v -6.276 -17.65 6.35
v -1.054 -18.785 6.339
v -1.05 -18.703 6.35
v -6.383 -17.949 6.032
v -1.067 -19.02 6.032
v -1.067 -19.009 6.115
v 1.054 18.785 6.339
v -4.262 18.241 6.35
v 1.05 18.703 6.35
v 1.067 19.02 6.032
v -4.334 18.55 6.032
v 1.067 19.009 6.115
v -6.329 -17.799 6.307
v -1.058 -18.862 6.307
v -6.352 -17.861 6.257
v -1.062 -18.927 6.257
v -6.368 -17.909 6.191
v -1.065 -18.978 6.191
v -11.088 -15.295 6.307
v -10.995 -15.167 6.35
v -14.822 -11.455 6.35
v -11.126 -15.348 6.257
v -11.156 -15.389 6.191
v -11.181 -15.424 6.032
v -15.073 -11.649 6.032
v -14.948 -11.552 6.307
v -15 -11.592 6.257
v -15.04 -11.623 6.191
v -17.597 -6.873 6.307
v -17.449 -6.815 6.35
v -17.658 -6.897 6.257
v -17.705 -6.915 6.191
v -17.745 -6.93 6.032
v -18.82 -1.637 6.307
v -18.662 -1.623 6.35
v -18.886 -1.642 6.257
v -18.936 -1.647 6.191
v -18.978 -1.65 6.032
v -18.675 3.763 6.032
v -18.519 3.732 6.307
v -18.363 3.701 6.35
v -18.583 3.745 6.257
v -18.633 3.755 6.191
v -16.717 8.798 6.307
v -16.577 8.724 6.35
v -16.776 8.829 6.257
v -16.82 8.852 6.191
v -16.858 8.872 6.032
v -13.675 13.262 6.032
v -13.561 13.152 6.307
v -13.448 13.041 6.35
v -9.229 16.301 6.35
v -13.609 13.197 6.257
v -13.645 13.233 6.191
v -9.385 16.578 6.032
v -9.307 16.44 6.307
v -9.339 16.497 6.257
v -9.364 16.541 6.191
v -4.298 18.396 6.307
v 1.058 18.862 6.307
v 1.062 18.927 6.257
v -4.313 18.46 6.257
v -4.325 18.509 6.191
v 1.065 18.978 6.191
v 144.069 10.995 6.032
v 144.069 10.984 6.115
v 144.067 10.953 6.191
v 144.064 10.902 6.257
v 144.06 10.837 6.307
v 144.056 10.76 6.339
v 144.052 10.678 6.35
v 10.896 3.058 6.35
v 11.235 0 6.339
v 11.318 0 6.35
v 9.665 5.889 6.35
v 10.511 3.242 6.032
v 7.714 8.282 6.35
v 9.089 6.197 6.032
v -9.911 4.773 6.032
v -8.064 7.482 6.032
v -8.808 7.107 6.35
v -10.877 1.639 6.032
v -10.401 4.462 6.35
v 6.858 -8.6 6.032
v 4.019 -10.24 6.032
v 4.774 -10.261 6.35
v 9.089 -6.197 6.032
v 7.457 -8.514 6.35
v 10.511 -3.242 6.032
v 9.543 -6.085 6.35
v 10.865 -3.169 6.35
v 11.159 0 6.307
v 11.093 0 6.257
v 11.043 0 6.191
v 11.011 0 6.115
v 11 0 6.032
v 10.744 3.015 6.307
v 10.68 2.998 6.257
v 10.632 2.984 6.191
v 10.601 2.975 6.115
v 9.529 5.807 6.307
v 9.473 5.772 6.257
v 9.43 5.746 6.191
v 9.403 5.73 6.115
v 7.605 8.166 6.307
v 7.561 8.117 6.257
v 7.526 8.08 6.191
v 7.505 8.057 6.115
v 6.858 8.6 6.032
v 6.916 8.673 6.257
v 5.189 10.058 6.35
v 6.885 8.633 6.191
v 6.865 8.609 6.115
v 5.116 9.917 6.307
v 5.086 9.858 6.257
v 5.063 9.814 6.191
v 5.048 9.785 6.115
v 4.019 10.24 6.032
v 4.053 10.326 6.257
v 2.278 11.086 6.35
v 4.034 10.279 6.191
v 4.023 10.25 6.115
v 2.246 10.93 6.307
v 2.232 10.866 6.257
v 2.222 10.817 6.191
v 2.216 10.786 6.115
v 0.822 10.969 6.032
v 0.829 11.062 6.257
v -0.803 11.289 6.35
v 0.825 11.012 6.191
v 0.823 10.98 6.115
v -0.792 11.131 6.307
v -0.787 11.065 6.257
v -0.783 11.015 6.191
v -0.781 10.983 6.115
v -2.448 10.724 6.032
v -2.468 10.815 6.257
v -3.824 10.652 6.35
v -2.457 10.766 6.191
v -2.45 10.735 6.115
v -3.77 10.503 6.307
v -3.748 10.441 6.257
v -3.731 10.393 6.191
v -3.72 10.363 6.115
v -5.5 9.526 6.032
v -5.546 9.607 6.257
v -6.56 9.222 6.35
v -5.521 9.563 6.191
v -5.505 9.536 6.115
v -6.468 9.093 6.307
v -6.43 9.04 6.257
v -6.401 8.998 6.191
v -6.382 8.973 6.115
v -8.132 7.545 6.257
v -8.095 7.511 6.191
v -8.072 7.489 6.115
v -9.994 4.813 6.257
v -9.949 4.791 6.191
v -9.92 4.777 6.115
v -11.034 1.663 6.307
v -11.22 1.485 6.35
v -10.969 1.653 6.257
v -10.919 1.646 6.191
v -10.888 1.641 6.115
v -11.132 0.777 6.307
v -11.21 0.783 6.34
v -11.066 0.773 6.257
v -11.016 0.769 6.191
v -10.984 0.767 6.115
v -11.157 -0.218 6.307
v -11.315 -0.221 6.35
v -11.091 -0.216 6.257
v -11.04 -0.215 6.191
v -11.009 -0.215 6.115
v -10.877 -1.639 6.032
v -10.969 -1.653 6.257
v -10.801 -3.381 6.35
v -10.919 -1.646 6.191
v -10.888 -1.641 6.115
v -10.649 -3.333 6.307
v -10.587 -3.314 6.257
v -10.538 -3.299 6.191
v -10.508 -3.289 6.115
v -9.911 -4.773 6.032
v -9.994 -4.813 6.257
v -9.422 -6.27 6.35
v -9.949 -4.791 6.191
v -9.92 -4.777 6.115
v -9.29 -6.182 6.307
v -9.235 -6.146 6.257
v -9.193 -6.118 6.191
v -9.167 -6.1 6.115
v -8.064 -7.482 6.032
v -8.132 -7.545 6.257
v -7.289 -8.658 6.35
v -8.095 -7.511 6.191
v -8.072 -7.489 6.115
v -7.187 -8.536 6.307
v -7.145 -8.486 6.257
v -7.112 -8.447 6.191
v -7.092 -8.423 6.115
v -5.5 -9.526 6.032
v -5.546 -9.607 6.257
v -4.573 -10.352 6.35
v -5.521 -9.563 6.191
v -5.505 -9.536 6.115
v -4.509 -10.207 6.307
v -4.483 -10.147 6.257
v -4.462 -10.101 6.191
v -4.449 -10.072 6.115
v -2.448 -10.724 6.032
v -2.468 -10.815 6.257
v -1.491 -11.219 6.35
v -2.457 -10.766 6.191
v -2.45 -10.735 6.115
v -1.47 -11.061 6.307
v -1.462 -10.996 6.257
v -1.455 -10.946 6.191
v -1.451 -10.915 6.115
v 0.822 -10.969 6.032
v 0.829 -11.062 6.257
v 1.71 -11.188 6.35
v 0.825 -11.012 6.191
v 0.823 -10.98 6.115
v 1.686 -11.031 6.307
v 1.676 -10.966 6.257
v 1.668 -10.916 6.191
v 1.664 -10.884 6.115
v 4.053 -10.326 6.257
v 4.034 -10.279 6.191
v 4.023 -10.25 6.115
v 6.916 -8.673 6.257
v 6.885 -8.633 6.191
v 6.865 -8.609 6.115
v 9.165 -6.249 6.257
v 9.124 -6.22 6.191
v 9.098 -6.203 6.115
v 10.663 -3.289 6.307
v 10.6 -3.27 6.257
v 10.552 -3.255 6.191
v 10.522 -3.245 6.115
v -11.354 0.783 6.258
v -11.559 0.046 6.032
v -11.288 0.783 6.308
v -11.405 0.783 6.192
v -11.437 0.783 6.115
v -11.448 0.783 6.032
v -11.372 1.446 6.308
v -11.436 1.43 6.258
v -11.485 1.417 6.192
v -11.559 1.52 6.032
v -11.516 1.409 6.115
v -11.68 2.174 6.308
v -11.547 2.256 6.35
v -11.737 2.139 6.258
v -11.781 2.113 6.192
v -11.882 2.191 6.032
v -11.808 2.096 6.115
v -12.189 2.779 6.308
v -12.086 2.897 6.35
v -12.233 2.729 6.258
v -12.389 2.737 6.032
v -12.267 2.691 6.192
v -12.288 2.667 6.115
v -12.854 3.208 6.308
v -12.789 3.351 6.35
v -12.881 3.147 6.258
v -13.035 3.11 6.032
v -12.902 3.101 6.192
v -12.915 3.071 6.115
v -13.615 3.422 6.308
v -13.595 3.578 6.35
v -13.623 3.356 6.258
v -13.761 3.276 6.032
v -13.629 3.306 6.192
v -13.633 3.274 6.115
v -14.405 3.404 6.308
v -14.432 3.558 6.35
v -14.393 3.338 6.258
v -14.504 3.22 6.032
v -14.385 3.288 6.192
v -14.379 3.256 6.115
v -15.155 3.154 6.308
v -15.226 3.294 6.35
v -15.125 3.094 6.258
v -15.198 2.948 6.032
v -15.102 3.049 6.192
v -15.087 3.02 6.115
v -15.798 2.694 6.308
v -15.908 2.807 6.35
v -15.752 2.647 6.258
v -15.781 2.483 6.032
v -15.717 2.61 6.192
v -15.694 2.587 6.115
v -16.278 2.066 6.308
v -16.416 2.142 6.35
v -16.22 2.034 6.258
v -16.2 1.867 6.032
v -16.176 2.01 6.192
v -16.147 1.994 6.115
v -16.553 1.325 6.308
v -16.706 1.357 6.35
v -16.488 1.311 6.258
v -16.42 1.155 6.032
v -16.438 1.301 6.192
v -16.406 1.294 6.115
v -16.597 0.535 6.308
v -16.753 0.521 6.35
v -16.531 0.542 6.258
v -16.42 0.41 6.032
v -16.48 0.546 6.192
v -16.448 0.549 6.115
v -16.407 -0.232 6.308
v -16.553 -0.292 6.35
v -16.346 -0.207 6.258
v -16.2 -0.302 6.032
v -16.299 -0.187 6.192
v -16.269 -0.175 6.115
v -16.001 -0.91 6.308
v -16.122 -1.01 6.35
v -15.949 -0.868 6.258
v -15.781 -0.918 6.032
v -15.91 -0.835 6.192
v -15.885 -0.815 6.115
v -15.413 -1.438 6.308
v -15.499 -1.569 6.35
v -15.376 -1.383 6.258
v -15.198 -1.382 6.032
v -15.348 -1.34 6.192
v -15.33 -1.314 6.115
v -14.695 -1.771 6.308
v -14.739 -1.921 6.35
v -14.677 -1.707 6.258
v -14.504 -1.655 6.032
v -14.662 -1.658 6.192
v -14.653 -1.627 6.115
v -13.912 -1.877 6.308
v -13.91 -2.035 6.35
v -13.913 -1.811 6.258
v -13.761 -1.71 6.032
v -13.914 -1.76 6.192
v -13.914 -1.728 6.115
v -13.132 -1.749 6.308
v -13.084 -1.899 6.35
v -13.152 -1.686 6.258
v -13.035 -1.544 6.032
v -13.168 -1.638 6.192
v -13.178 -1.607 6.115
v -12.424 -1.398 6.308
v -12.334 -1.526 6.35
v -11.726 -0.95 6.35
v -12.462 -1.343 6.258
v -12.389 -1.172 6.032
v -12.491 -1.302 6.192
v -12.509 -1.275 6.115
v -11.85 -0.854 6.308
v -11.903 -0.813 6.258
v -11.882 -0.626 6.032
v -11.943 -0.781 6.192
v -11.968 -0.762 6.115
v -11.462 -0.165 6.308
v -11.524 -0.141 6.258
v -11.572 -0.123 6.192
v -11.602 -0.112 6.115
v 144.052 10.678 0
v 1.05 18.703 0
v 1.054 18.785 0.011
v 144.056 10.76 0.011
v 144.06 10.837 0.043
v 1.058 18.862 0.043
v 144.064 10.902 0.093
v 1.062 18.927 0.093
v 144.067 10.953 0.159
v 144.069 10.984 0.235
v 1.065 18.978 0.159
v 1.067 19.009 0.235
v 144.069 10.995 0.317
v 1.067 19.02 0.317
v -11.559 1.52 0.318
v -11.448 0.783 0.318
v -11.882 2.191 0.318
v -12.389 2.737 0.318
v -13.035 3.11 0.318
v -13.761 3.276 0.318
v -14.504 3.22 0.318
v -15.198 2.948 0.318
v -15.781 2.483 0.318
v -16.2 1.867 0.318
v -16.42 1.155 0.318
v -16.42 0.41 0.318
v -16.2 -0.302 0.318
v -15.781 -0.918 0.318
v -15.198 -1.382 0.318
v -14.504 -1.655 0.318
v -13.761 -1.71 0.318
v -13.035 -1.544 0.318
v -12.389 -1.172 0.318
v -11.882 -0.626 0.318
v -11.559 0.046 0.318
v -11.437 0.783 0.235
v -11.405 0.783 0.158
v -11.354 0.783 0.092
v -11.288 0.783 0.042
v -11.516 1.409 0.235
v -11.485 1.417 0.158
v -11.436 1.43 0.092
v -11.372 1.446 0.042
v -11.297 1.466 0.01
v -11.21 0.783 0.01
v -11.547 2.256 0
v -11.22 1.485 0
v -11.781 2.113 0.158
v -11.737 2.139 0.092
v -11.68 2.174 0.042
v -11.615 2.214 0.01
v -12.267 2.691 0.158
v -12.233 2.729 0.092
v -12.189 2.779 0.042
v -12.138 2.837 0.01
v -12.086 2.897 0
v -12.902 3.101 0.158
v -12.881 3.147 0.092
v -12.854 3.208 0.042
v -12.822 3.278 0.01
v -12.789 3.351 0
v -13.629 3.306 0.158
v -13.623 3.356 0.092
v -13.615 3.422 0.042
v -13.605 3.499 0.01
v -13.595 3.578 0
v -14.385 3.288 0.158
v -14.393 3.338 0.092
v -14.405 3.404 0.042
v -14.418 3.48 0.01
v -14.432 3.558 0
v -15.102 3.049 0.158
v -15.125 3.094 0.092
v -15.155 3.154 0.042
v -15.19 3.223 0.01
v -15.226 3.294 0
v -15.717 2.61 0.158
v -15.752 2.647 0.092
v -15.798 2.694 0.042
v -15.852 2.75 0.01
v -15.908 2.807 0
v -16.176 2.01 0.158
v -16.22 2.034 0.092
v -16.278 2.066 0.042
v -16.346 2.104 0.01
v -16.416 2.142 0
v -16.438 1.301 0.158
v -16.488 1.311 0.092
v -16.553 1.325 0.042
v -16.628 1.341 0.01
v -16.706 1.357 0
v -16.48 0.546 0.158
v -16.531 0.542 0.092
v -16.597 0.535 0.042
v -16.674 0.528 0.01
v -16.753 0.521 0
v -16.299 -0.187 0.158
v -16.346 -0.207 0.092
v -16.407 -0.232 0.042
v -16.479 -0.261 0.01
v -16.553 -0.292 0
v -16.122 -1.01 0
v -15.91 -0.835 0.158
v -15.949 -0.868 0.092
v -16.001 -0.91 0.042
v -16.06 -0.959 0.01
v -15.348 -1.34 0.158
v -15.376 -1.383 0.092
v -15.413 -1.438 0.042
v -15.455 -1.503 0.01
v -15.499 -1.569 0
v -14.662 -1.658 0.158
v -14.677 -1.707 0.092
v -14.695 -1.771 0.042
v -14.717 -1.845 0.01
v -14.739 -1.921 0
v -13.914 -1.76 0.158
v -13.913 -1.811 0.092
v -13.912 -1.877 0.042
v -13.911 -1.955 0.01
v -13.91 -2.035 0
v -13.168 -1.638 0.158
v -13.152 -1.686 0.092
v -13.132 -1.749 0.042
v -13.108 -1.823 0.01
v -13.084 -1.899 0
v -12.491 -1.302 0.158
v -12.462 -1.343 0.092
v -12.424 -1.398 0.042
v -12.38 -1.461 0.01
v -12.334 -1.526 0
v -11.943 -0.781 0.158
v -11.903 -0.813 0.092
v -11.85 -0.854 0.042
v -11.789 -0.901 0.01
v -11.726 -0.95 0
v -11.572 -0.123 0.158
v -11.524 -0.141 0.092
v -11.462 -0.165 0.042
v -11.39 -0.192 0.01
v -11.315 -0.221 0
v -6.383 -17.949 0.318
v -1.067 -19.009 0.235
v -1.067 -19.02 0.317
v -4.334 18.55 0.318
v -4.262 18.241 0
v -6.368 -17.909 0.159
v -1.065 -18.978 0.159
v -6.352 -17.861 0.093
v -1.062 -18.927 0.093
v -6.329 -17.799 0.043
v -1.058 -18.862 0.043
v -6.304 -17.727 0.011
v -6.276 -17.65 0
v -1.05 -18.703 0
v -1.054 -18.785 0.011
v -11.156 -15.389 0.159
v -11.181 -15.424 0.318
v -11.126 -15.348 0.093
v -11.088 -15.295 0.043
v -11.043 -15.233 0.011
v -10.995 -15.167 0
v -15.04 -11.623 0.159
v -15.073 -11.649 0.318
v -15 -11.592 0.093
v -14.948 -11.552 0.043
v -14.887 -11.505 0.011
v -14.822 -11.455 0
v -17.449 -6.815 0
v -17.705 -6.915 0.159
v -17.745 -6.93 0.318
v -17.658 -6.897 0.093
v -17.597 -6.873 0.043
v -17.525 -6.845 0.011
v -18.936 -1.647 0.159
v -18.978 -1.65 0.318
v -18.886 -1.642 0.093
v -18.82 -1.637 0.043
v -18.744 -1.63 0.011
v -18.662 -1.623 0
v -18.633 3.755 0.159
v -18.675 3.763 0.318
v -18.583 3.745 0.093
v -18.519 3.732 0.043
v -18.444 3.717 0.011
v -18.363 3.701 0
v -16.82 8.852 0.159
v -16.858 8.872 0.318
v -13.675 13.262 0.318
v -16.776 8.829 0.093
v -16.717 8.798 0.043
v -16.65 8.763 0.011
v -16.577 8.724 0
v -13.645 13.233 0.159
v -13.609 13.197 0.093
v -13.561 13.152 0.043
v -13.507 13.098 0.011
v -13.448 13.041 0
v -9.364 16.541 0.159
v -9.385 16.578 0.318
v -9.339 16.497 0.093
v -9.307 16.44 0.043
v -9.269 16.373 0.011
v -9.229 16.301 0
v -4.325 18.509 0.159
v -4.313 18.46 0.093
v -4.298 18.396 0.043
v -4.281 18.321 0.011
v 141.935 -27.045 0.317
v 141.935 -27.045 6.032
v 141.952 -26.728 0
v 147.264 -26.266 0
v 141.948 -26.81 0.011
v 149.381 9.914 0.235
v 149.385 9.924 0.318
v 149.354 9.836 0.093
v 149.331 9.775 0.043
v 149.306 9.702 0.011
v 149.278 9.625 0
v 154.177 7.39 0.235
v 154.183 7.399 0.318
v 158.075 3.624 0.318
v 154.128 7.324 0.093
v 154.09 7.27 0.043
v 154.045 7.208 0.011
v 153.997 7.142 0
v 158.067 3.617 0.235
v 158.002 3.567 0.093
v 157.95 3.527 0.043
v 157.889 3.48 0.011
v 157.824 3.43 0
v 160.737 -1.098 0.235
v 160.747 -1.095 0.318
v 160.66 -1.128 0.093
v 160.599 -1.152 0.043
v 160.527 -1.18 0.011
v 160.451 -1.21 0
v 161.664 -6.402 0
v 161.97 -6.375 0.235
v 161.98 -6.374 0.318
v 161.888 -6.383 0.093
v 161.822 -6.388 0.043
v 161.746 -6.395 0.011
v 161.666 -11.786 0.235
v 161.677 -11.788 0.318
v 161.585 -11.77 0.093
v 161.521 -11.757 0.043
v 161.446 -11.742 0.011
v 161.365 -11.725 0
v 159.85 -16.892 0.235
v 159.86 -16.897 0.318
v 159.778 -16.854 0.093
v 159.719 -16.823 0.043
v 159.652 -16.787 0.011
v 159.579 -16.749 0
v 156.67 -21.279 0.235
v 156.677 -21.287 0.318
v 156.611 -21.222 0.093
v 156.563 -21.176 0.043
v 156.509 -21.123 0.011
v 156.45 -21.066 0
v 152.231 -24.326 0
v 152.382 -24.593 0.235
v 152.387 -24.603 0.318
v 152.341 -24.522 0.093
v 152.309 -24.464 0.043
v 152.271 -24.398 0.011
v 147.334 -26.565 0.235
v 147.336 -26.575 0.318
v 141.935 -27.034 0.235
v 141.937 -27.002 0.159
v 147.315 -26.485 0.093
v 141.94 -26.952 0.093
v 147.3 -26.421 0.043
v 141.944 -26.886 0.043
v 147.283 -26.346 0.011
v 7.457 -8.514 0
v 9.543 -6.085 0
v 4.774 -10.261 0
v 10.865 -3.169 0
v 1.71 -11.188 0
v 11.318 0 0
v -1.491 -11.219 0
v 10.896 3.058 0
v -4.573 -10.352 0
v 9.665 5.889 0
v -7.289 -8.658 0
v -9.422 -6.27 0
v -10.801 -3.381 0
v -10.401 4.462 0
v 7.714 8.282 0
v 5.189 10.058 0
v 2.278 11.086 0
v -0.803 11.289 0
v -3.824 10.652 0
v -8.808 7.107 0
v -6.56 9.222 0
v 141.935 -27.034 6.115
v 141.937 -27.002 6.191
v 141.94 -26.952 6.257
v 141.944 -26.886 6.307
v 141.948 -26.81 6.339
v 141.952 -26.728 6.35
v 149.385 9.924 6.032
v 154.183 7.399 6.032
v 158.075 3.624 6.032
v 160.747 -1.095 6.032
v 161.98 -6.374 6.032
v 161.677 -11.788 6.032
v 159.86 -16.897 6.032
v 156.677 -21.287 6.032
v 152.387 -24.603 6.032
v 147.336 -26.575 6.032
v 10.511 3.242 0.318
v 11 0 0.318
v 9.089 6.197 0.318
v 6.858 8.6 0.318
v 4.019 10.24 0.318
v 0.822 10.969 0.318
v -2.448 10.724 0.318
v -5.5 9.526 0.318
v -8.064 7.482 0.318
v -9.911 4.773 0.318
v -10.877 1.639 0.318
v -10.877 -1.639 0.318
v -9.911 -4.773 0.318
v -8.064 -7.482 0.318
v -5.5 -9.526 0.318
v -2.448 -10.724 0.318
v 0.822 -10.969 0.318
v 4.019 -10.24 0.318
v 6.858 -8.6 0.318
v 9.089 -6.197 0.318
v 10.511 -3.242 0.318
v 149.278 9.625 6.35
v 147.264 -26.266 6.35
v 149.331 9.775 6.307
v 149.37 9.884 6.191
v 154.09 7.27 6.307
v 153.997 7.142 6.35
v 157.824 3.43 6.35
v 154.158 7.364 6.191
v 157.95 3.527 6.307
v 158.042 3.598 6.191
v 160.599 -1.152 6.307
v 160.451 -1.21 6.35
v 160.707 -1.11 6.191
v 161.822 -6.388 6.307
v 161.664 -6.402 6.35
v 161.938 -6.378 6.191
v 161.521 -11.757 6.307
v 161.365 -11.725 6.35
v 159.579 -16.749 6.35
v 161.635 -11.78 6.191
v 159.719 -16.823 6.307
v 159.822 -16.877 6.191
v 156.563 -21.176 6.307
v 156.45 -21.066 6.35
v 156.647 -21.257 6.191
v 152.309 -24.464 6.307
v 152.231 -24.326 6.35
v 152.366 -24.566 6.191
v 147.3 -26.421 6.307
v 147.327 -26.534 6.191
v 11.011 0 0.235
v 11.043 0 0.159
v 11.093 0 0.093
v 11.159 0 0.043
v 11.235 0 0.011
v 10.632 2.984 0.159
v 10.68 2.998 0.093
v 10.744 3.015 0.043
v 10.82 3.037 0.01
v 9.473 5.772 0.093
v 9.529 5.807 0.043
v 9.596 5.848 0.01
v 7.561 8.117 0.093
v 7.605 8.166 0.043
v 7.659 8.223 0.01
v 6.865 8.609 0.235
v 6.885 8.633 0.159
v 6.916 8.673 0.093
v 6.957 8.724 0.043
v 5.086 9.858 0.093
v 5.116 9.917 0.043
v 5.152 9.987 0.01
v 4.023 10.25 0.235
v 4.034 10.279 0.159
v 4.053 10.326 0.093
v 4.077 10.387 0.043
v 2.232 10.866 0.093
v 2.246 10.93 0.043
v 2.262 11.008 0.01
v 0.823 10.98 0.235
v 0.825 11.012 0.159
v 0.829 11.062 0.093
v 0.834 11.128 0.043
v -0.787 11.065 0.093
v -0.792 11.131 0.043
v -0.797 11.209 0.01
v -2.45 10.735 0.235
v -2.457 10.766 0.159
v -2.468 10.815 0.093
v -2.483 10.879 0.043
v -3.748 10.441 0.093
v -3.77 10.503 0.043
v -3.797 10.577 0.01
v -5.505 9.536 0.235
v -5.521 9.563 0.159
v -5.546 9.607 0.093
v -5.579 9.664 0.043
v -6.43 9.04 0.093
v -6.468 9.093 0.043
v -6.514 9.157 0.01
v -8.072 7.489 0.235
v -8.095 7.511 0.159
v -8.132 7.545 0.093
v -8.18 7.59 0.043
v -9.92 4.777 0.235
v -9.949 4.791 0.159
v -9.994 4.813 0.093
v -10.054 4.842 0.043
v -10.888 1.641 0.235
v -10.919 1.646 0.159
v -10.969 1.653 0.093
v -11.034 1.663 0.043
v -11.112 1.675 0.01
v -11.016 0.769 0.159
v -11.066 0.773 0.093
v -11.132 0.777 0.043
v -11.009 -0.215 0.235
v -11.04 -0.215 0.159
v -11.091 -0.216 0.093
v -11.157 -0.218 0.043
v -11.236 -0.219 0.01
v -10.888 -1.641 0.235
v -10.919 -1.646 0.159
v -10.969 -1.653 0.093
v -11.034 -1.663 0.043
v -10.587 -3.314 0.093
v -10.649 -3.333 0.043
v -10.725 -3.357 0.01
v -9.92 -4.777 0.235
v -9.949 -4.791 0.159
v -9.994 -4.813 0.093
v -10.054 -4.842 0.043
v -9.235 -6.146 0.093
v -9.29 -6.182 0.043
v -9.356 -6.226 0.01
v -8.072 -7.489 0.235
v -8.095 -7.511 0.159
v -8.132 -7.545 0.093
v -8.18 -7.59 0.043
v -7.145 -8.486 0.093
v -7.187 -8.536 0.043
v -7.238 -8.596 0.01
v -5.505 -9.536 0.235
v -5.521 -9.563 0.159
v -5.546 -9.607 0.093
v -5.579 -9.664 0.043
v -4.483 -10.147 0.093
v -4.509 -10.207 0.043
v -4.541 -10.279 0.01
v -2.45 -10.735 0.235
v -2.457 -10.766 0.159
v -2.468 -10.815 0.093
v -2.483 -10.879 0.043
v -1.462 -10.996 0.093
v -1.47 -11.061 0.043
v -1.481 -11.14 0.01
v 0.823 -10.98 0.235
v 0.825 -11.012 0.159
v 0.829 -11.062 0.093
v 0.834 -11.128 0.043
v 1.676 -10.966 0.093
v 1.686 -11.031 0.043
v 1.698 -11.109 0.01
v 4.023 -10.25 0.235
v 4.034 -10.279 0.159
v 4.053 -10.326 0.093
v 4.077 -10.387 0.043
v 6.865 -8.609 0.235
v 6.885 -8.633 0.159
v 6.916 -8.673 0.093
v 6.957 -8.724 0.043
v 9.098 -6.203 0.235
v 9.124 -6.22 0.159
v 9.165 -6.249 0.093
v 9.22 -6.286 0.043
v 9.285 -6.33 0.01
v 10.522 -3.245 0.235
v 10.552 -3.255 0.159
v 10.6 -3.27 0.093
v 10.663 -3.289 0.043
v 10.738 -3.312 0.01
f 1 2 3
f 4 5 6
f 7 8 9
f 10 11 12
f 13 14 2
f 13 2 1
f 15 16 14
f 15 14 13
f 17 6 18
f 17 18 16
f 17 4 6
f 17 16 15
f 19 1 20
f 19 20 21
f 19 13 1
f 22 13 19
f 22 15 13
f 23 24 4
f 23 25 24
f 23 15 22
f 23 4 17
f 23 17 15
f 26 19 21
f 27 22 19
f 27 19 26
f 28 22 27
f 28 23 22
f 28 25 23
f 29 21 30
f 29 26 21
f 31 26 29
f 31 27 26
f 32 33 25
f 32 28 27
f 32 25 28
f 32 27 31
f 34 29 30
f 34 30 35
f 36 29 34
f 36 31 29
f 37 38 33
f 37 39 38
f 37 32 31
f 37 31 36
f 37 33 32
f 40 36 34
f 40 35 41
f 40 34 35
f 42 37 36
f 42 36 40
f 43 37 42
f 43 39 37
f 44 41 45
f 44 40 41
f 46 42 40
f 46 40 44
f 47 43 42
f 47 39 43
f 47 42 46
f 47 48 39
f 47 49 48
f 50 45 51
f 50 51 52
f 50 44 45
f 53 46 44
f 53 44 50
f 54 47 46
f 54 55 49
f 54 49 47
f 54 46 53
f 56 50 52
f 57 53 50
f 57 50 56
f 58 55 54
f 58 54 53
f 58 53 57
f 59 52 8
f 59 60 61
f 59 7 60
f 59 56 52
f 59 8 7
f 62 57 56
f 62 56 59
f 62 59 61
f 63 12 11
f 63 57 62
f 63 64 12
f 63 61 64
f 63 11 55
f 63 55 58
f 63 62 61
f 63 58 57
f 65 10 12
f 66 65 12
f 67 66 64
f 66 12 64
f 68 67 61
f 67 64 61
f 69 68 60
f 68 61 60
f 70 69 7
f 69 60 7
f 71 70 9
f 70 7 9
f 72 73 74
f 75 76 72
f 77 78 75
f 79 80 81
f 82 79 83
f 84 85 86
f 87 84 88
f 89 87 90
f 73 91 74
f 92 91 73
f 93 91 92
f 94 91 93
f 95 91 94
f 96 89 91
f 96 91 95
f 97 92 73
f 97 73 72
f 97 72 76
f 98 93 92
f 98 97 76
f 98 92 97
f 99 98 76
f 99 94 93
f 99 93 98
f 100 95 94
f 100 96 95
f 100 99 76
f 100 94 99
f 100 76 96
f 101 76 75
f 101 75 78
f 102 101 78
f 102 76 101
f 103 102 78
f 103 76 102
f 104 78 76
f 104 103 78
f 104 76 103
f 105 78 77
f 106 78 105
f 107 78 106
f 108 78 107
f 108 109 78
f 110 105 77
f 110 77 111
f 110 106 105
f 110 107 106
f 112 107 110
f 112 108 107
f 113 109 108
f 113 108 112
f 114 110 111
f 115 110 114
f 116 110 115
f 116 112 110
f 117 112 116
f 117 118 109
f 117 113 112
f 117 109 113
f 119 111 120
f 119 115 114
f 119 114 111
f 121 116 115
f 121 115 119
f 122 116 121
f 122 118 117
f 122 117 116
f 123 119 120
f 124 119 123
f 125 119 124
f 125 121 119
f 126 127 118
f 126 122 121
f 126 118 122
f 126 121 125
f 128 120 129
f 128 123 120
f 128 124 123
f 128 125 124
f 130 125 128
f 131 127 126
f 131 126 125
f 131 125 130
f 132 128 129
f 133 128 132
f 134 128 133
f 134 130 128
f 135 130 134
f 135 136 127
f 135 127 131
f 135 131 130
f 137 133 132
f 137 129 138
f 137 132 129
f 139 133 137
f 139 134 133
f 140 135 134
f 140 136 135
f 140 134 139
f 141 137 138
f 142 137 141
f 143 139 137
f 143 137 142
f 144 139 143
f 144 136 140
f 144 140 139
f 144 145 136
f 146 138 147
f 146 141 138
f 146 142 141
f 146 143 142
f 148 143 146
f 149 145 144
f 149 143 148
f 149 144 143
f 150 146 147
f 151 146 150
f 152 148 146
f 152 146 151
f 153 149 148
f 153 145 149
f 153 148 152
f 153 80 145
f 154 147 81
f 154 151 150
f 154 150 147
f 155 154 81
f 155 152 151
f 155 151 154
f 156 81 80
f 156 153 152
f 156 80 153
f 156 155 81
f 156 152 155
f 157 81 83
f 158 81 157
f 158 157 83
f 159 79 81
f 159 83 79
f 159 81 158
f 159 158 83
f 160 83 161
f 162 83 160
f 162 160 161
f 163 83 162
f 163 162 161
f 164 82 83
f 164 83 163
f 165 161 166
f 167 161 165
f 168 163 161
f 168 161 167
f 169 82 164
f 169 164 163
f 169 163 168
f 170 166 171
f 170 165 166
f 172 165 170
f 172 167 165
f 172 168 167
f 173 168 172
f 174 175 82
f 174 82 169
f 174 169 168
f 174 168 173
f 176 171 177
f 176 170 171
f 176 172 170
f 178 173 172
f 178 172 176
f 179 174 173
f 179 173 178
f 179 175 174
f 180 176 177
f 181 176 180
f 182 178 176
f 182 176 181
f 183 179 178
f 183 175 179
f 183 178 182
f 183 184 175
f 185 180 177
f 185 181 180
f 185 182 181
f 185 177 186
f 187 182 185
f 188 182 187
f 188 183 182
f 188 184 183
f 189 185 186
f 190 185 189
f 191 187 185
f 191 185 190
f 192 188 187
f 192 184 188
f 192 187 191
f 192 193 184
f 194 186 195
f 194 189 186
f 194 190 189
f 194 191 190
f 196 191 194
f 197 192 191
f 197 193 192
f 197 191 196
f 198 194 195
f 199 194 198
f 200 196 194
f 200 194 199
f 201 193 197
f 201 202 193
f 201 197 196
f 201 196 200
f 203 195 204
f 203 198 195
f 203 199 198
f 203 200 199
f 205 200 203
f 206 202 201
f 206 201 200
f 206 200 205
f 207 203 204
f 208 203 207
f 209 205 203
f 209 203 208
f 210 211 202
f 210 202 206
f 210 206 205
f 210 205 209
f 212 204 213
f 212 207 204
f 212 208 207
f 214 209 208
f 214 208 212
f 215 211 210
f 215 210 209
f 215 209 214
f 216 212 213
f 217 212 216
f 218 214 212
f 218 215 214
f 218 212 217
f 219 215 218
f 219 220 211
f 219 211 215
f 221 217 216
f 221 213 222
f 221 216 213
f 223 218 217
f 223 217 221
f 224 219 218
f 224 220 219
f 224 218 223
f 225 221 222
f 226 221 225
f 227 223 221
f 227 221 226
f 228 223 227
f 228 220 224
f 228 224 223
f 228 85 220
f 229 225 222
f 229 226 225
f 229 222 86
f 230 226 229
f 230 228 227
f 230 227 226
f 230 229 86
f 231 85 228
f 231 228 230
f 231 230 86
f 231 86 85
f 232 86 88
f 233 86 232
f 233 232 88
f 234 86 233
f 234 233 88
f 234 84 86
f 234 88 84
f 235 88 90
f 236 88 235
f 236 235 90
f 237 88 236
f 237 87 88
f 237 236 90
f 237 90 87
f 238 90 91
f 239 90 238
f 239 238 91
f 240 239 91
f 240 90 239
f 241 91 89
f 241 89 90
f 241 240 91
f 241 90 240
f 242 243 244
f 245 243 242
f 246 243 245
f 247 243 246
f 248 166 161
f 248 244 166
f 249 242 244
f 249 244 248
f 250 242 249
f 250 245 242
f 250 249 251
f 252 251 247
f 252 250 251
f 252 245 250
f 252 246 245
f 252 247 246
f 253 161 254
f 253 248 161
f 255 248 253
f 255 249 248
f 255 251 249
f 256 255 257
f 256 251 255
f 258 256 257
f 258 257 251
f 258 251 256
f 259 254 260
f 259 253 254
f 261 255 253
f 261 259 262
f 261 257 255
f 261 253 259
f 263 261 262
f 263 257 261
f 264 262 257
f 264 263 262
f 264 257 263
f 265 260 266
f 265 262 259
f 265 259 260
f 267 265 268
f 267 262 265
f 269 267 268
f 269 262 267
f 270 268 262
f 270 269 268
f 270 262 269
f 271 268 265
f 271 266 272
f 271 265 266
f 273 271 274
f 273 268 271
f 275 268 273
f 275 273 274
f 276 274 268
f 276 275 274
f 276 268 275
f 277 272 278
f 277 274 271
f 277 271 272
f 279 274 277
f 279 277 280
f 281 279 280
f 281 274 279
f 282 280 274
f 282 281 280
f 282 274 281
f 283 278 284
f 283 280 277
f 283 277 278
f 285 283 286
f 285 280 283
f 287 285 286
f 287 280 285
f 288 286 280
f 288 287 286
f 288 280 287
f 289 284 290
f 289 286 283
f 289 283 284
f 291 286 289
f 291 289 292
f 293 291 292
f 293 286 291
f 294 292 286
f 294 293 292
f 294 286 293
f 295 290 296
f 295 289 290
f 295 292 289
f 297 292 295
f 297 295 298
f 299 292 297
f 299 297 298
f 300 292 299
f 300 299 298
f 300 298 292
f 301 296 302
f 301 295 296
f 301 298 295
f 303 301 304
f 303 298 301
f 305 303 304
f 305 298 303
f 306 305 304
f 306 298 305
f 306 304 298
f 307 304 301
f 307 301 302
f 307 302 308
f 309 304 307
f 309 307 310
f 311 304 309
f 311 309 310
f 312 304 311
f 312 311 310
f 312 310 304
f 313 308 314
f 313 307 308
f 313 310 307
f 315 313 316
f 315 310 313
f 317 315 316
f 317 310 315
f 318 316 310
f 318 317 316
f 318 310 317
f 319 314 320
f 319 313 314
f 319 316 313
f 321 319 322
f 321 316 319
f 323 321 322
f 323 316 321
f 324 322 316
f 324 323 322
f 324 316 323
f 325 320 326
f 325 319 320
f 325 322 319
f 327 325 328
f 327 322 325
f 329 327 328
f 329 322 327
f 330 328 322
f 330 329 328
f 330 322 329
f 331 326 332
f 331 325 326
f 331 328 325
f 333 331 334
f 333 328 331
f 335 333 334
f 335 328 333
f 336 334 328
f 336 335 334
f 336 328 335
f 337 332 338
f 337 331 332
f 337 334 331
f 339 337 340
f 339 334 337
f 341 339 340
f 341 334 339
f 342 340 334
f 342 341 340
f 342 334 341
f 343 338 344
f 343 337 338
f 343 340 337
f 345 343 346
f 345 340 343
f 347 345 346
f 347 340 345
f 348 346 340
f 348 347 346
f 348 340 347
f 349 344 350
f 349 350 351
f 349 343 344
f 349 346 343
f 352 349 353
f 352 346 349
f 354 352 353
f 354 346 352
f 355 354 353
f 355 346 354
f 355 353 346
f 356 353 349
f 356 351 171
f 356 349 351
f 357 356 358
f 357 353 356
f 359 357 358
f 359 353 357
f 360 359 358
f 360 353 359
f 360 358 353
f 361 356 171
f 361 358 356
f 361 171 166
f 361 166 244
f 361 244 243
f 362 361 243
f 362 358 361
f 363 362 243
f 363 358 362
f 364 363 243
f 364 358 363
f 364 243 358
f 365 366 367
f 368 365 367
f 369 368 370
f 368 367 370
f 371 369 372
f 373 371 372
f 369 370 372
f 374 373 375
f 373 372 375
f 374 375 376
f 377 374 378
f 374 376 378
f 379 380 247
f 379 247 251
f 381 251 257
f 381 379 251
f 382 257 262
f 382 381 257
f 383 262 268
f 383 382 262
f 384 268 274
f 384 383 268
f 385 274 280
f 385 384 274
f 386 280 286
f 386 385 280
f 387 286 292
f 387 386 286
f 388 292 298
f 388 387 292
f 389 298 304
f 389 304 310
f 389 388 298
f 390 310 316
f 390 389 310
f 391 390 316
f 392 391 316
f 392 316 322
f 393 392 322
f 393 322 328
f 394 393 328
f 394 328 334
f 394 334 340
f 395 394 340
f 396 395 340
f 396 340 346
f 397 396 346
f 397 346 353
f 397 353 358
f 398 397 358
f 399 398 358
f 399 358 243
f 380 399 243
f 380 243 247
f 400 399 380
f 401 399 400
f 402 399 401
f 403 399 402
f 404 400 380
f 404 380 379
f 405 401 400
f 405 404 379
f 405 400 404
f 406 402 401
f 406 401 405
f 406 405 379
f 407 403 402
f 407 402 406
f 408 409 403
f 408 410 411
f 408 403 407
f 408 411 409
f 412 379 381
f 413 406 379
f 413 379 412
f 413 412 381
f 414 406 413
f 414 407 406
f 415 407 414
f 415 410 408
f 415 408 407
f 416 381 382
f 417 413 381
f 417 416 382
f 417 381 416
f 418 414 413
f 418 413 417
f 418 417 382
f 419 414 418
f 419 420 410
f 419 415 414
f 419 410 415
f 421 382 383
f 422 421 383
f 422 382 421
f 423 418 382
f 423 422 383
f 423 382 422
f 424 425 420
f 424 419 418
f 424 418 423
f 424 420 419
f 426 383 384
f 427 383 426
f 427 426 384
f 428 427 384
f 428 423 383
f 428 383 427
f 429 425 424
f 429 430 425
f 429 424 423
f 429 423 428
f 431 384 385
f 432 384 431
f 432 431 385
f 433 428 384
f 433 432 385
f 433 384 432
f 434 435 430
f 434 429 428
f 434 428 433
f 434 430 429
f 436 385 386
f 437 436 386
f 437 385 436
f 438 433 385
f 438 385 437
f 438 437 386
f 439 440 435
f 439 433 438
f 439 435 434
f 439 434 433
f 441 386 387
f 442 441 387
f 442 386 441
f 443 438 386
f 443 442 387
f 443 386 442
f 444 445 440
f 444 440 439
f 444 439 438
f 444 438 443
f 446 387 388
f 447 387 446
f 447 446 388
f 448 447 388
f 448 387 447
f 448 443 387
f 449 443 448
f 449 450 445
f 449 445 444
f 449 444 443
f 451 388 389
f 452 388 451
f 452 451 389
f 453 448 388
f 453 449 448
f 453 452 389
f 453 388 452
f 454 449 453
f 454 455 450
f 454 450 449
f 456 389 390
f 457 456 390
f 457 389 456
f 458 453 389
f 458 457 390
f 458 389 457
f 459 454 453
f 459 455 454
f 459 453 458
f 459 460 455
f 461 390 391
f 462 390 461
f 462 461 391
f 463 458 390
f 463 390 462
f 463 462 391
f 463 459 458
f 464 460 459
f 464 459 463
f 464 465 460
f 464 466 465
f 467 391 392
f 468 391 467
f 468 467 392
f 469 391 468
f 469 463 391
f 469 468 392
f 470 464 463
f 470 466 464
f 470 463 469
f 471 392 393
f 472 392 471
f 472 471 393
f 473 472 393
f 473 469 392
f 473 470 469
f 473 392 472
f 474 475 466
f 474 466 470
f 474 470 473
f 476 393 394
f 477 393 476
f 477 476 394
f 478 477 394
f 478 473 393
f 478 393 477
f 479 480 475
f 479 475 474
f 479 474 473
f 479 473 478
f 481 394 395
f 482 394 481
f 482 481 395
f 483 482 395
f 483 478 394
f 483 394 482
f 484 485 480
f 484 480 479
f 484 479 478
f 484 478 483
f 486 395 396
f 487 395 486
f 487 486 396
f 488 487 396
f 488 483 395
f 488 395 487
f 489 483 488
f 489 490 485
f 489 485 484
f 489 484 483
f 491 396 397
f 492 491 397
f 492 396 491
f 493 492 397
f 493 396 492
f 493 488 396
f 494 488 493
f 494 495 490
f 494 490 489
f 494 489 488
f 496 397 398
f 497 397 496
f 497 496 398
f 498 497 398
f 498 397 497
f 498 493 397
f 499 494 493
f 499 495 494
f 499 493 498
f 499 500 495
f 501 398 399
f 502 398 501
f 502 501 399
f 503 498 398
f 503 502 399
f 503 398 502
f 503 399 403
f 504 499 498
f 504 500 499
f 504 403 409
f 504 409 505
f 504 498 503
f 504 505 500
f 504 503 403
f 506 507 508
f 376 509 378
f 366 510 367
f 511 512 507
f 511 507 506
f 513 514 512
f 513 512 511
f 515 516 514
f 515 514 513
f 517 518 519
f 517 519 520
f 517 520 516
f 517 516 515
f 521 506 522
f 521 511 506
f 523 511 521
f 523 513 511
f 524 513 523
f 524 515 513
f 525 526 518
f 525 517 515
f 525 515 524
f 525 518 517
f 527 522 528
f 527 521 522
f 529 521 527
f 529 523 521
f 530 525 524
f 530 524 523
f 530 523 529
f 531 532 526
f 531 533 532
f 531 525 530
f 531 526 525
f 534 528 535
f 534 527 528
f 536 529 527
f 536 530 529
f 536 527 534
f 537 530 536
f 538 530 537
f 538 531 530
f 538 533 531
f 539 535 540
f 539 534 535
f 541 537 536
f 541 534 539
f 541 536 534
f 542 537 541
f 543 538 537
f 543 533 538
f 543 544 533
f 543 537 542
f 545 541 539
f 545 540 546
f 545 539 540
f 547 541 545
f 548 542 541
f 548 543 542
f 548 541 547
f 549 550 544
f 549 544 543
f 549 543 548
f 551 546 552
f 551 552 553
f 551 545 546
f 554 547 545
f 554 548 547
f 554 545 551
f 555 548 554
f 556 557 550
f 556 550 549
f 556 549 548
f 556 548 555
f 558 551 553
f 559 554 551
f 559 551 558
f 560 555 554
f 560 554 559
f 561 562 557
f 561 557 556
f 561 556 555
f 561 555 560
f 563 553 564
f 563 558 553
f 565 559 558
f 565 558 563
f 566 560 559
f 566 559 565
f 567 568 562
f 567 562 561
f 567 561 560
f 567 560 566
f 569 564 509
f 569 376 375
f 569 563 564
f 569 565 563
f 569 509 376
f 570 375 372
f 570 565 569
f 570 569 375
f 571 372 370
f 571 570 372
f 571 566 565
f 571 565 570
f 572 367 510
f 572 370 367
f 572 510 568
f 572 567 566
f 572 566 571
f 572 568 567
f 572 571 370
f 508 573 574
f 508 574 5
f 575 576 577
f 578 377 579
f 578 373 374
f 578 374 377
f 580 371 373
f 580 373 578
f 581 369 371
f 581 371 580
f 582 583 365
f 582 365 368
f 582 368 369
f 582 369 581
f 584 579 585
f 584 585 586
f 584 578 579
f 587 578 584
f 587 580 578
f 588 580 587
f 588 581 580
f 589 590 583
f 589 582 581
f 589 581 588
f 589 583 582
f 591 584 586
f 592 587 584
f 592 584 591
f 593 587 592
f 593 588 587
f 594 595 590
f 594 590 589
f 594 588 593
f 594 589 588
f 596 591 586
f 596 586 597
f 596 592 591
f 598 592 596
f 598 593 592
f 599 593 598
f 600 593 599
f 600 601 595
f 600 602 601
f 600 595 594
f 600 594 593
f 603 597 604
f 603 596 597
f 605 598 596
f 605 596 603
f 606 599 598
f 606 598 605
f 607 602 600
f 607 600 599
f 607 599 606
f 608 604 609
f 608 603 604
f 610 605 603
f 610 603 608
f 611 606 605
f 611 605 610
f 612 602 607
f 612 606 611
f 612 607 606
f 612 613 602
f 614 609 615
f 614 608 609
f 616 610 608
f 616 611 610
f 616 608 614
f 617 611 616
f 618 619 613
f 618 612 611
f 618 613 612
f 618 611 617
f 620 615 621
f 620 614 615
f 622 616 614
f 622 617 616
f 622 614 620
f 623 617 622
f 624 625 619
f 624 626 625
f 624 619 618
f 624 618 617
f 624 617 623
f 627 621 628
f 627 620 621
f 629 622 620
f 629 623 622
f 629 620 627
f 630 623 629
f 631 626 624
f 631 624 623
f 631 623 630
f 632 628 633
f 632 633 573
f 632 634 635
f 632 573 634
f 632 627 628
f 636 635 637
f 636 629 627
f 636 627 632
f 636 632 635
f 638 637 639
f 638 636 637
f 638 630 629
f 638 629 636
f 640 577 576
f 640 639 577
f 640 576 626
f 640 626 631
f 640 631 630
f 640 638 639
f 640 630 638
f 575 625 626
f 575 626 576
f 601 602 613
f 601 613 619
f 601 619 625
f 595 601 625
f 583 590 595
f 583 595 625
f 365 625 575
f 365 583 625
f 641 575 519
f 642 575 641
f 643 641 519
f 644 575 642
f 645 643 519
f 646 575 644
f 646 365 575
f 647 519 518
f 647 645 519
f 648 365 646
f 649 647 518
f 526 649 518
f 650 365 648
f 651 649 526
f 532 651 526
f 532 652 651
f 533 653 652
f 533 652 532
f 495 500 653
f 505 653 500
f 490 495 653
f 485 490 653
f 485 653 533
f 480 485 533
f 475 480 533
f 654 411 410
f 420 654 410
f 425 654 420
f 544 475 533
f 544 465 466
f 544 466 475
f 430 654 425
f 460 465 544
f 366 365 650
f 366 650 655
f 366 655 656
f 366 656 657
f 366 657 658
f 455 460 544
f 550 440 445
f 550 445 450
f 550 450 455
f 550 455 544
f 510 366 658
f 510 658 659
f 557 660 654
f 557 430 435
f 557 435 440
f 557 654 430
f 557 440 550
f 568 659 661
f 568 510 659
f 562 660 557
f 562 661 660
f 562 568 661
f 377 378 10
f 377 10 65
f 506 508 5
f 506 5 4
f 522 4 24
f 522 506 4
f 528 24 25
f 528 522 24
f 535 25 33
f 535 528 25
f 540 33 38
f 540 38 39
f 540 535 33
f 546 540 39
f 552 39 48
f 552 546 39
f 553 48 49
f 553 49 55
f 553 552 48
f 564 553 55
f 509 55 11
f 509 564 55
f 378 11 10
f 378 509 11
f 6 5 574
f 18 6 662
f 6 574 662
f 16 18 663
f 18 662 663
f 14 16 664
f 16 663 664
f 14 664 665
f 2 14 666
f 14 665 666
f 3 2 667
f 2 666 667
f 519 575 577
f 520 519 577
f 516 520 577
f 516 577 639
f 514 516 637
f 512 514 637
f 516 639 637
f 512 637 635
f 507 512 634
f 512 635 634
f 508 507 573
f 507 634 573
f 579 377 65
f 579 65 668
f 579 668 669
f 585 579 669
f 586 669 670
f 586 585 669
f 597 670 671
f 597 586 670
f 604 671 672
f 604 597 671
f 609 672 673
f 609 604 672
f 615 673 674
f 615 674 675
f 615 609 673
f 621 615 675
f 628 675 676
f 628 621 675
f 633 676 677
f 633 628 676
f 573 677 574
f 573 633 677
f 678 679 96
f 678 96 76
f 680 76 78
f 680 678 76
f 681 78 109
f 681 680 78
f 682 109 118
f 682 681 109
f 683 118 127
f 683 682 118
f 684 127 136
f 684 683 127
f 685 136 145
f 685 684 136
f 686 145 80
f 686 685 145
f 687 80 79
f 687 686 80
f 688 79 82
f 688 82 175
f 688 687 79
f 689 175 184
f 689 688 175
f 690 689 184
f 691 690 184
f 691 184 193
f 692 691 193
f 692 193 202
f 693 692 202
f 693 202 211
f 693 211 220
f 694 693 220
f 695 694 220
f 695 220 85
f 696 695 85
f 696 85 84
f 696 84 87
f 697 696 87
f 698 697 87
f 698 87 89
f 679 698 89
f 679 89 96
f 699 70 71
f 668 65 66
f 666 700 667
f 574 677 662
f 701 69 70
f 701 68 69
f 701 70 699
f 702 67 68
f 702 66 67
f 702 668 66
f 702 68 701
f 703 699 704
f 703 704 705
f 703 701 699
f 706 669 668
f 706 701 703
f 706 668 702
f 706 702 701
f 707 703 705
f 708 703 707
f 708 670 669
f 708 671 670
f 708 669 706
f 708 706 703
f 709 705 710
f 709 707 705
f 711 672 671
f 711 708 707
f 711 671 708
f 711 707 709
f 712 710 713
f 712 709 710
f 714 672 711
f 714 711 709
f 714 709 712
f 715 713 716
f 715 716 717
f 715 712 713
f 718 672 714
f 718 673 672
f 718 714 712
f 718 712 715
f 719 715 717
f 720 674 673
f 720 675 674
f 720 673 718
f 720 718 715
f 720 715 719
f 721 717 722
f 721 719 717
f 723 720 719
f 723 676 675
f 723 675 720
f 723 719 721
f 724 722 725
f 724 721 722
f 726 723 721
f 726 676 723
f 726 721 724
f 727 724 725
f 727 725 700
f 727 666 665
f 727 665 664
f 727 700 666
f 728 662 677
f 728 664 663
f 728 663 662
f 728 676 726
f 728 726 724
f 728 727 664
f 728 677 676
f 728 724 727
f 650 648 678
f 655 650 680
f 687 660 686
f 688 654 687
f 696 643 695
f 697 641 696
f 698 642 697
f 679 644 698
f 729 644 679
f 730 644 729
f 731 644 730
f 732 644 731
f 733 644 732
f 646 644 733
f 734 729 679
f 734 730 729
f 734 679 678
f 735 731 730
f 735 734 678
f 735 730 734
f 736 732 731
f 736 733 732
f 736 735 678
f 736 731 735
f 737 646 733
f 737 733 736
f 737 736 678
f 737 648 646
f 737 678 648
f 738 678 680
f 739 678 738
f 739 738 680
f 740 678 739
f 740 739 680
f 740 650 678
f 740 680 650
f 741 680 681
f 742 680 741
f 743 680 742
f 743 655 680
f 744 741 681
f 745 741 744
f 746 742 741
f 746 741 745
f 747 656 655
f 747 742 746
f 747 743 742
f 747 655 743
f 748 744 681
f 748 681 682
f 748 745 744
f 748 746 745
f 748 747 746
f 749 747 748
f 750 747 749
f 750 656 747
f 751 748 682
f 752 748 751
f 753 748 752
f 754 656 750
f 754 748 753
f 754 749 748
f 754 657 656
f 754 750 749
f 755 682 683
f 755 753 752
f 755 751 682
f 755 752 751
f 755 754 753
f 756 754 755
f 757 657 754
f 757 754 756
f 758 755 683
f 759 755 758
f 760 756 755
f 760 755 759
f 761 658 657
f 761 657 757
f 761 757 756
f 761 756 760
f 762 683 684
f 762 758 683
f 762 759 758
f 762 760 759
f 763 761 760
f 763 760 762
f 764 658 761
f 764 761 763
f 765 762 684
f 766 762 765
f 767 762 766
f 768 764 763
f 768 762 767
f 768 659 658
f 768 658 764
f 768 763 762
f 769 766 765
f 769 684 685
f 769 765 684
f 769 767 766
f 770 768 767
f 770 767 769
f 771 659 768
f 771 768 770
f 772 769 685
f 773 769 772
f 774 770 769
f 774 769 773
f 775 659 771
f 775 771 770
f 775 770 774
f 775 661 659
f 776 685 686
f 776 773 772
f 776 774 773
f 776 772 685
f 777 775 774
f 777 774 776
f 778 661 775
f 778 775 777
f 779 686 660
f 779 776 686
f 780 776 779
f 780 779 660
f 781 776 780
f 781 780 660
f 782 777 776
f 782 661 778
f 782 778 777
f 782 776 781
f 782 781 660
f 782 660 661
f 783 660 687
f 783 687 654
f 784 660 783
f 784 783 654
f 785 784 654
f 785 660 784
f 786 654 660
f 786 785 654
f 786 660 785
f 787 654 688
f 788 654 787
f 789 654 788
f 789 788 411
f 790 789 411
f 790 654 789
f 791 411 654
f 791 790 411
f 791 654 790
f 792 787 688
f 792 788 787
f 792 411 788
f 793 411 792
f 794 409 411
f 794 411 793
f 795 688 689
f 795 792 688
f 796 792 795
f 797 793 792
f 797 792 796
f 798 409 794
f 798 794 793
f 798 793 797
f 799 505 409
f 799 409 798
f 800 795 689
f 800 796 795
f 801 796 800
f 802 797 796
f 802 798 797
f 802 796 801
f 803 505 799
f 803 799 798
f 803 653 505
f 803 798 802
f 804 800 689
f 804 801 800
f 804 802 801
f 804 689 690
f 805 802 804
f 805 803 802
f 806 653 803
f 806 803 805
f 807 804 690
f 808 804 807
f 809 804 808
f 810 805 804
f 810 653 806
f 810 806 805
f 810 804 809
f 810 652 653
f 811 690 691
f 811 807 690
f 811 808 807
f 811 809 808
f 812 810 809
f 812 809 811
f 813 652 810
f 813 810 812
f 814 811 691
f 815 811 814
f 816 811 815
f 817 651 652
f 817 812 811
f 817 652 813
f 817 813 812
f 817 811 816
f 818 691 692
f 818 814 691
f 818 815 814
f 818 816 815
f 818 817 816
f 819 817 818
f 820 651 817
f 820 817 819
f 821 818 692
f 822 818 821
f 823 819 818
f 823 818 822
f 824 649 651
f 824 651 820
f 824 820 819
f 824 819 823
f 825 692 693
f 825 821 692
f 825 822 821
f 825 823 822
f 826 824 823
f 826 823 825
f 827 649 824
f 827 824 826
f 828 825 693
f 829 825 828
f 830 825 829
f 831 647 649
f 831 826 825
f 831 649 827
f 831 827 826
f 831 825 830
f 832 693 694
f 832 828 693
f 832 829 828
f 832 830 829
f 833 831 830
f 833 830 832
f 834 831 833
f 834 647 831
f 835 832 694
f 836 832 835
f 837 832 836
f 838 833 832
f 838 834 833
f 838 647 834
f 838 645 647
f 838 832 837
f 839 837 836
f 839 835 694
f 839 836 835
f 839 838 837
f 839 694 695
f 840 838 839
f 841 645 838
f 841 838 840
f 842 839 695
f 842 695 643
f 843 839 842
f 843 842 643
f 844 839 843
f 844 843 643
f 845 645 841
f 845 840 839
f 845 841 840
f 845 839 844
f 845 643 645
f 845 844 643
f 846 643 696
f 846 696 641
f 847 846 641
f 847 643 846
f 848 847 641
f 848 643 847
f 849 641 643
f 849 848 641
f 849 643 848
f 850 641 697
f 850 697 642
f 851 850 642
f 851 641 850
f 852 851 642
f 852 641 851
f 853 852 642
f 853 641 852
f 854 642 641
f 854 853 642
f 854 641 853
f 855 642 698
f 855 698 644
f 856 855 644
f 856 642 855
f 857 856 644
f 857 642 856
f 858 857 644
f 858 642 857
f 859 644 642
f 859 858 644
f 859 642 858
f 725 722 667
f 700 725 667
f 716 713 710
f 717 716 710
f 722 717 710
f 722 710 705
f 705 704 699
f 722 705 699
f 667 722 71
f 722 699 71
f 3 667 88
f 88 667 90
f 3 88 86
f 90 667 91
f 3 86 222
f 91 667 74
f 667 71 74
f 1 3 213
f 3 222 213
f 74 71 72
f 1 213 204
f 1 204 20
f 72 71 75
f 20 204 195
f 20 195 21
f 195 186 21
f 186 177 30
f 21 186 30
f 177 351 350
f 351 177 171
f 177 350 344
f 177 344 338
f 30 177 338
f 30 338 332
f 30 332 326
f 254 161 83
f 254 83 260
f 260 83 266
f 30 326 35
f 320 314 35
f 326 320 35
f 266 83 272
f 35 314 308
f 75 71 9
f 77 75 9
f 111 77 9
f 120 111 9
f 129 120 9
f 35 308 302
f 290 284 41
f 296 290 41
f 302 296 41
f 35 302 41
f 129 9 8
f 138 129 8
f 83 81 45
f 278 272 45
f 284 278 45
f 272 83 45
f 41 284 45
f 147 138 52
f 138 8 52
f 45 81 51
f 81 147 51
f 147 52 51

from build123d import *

# Parameters (mm, degrees)
SKETCH1_R           = 11
SKETCH1_R_2         = 2.499999953
BOSS_EXTRUDE1_DEPTH = 6.35
FILLET1_R           = 0.3175


with BuildPart() as part:
    # Sketch1 → Boss-Extrude1 (new body)
    with BuildSketch(Plane.XY):
        with BuildLine():
            Line((1.067348026, 19.020075399), (144.069348026, 10.995243779))
            ThreePointArc((144.069348026, 10.995243779), (162.022075399, -9.092179646), (141.934651974, -27.044907019))
            Line((141.934651974, -27.044907019), (-1.067348026, -19.020075399))
            ThreePointArc((-1.067348026, -19.020075399), (-19.020075399, 1.067348026), (1.067348026, 19.020075399))
        make_face()
        Circle(SKETCH1_R, mode=Mode.SUBTRACT)
        with Locations((-13.948055293, 0.782721886)):
            Circle(SKETCH1_R_2, mode=Mode.SUBTRACT)
    extrude(amount=BOSS_EXTRUDE1_DEPTH)

    # Fillet1
    # the kernel refuses this fillet: 0.3175 mm, written as the material it takes off along each edge
    with BuildSketch(Plane(origin=(143.002, -8.02483162, 6.35), x_dir=(0.05602876779124647, 0.9984291548125959, 0), z_dir=(-0.9984291548125959, 0.05602876779124647, 0))) as fillet1_piece_1:
        with BuildLine():
            CenterArc((19.05 - FILLET1_R, FILLET1_R), FILLET1_R, 270, 90)
            Line((19.05 - FILLET1_R, 0), (19.05, 0))
            Line((19.05, 0), (19.05, FILLET1_R))
        make_face()
    revolve(axis=Axis((143.002, -8.02483162, 6.35), (0, 0, -1)), revolution_arc=180, mode=Mode.SUBTRACT)
    with BuildSketch(Plane(origin=(0, 0, 0), x_dir=(1, 0, 0), z_dir=(0, -1, 0))) as fillet1_piece_2:
        with BuildLine():
            CenterArc((11 + FILLET1_R, FILLET1_R), FILLET1_R, 180, 90)
            Line((11 + FILLET1_R, 0), (11, 0))
            Line((11, 0), (11, FILLET1_R))
        make_face()
    revolve(axis=Axis((0, 0, 0), (0, 0, 1)), mode=Mode.SUBTRACT)
    with BuildSketch(Plane(origin=(0, 0, 6.35), x_dir=(1, 0, 0), z_dir=(0, -1, 0))) as fillet1_piece_3:
        with BuildLine():
            CenterArc((11 + FILLET1_R, -FILLET1_R), FILLET1_R, 90, 90)
            Line((11 + FILLET1_R, 0), (11, 0))
            Line((11, 0), (11, -FILLET1_R))
        make_face()
    revolve(axis=Axis((0, 0, 6.35), (0, 0, 1)), mode=Mode.SUBTRACT)
    with BuildSketch(Plane(origin=(1.067348026, 19.020075399, 6.35), x_dir=(0, 0, -1), z_dir=(0.998429154812596, -0.056028767791246756, 0)), Plane(origin=(141.934651974, -27.044907019, 6.35), x_dir=(0, 0, -1), z_dir=(-0.998429154812596, 0.05602876779124666, 0))) as fillet1_piece_4:
        with BuildLine():
            CenterArc((FILLET1_R, -FILLET1_R), FILLET1_R, 90, 90)
            Line((0, -FILLET1_R), (0, 0))
            Line((0, 0), (FILLET1_R, 0))
        make_face()
    extrude(amount=143.226987424, mode=Mode.SUBTRACT)
    with BuildSketch(Plane(origin=(-13.948055293, 0.782721886, 0), x_dir=(1, 0, 0), z_dir=(0, -1, 0))) as fillet1_piece_5:
        with BuildLine():
            CenterArc((2.499999953 + FILLET1_R, FILLET1_R), FILLET1_R, 180, 90)
            Line((2.499999953 + FILLET1_R, 0), (2.499999953, 0))
            Line((2.499999953, 0), (2.499999953, FILLET1_R))
        make_face()
    revolve(axis=Axis((-13.948055293, 0.782721886, 0), (0, 0, 1)), mode=Mode.SUBTRACT)
    with BuildSketch(Plane(origin=(-13.948055293, 0.782721886, 6.35), x_dir=(1, 0, 0), z_dir=(0, -1, 0))) as fillet1_piece_6:
        with BuildLine():
            CenterArc((2.499999953 + FILLET1_R, -FILLET1_R), FILLET1_R, 90, 90)
            Line((2.499999953 + FILLET1_R, 0), (2.499999953, 0))
            Line((2.499999953, 0), (2.499999953, -FILLET1_R))
        make_face()
    revolve(axis=Axis((-13.948055293, 0.782721886, 6.35), (0, 0, 1)), mode=Mode.SUBTRACT)
    with BuildSketch(Plane(origin=(0, 0, 6.35), x_dir=(-0.05602876779124687, -0.9984291548125959, 0), z_dir=(0.9984291548125959, -0.05602876779124687, 0))) as fillet1_piece_7:
        with BuildLine():
            CenterArc((19.05 - FILLET1_R, FILLET1_R), FILLET1_R, 270, 90)
            Line((19.05 - FILLET1_R, 0), (19.05, 0))
            Line((19.05, 0), (19.05, FILLET1_R))
        make_face()
    revolve(axis=Axis((0, 0, 6.35), (0, 0, -1)), revolution_arc=180, mode=Mode.SUBTRACT)
    with BuildSketch(Plane(origin=(1.067348026, 19.020075399, 0), x_dir=(0, 0, 1), z_dir=(0.998429154812596, -0.056028767791246756, 0)), Plane(origin=(141.934651974, -27.044907019, 0), x_dir=(0, 0, 1), z_dir=(-0.998429154812596, 0.05602876779124666, 0))) as fillet1_piece_8:
        with BuildLine():
            CenterArc((FILLET1_R, FILLET1_R), FILLET1_R, 180, 90)
            Line((0, FILLET1_R), (0, 0))
            Line((0, 0), (FILLET1_R, 0))
        make_face()
    extrude(amount=143.226987424, mode=Mode.SUBTRACT)
    with BuildSketch(Plane(origin=(143.002, -8.02483162, 0), x_dir=(0.05602876779124647, 0.9984291548125959, 0), z_dir=(-0.9984291548125959, 0.05602876779124647, 0))) as fillet1_piece_9:
        with BuildLine():
            CenterArc((19.05 - FILLET1_R, -FILLET1_R), FILLET1_R, 0, 90)
            Line((19.05 - FILLET1_R, 0), (19.05, 0))
            Line((19.05, 0), (19.05, -FILLET1_R))
        make_face()
    revolve(axis=Axis((143.002, -8.02483162, 0), (0, 0, -1)), revolution_arc=180, mode=Mode.SUBTRACT)
    with BuildSketch(Plane(origin=(0, 0, 0), x_dir=(-0.05602876779124687, -0.9984291548125959, 0), z_dir=(0.9984291548125959, -0.05602876779124687, 0))) as fillet1_piece_10:
        with BuildLine():
            CenterArc((19.05 - FILLET1_R, -FILLET1_R), FILLET1_R, 0, 90)
            Line((19.05 - FILLET1_R, 0), (19.05, 0))
            Line((19.05, 0), (19.05, -FILLET1_R))
        make_face()
    revolve(axis=Axis((0, 0, 0), (0, 0, -1)), revolution_arc=180, mode=Mode.SUBTRACT)


solid = part.part
